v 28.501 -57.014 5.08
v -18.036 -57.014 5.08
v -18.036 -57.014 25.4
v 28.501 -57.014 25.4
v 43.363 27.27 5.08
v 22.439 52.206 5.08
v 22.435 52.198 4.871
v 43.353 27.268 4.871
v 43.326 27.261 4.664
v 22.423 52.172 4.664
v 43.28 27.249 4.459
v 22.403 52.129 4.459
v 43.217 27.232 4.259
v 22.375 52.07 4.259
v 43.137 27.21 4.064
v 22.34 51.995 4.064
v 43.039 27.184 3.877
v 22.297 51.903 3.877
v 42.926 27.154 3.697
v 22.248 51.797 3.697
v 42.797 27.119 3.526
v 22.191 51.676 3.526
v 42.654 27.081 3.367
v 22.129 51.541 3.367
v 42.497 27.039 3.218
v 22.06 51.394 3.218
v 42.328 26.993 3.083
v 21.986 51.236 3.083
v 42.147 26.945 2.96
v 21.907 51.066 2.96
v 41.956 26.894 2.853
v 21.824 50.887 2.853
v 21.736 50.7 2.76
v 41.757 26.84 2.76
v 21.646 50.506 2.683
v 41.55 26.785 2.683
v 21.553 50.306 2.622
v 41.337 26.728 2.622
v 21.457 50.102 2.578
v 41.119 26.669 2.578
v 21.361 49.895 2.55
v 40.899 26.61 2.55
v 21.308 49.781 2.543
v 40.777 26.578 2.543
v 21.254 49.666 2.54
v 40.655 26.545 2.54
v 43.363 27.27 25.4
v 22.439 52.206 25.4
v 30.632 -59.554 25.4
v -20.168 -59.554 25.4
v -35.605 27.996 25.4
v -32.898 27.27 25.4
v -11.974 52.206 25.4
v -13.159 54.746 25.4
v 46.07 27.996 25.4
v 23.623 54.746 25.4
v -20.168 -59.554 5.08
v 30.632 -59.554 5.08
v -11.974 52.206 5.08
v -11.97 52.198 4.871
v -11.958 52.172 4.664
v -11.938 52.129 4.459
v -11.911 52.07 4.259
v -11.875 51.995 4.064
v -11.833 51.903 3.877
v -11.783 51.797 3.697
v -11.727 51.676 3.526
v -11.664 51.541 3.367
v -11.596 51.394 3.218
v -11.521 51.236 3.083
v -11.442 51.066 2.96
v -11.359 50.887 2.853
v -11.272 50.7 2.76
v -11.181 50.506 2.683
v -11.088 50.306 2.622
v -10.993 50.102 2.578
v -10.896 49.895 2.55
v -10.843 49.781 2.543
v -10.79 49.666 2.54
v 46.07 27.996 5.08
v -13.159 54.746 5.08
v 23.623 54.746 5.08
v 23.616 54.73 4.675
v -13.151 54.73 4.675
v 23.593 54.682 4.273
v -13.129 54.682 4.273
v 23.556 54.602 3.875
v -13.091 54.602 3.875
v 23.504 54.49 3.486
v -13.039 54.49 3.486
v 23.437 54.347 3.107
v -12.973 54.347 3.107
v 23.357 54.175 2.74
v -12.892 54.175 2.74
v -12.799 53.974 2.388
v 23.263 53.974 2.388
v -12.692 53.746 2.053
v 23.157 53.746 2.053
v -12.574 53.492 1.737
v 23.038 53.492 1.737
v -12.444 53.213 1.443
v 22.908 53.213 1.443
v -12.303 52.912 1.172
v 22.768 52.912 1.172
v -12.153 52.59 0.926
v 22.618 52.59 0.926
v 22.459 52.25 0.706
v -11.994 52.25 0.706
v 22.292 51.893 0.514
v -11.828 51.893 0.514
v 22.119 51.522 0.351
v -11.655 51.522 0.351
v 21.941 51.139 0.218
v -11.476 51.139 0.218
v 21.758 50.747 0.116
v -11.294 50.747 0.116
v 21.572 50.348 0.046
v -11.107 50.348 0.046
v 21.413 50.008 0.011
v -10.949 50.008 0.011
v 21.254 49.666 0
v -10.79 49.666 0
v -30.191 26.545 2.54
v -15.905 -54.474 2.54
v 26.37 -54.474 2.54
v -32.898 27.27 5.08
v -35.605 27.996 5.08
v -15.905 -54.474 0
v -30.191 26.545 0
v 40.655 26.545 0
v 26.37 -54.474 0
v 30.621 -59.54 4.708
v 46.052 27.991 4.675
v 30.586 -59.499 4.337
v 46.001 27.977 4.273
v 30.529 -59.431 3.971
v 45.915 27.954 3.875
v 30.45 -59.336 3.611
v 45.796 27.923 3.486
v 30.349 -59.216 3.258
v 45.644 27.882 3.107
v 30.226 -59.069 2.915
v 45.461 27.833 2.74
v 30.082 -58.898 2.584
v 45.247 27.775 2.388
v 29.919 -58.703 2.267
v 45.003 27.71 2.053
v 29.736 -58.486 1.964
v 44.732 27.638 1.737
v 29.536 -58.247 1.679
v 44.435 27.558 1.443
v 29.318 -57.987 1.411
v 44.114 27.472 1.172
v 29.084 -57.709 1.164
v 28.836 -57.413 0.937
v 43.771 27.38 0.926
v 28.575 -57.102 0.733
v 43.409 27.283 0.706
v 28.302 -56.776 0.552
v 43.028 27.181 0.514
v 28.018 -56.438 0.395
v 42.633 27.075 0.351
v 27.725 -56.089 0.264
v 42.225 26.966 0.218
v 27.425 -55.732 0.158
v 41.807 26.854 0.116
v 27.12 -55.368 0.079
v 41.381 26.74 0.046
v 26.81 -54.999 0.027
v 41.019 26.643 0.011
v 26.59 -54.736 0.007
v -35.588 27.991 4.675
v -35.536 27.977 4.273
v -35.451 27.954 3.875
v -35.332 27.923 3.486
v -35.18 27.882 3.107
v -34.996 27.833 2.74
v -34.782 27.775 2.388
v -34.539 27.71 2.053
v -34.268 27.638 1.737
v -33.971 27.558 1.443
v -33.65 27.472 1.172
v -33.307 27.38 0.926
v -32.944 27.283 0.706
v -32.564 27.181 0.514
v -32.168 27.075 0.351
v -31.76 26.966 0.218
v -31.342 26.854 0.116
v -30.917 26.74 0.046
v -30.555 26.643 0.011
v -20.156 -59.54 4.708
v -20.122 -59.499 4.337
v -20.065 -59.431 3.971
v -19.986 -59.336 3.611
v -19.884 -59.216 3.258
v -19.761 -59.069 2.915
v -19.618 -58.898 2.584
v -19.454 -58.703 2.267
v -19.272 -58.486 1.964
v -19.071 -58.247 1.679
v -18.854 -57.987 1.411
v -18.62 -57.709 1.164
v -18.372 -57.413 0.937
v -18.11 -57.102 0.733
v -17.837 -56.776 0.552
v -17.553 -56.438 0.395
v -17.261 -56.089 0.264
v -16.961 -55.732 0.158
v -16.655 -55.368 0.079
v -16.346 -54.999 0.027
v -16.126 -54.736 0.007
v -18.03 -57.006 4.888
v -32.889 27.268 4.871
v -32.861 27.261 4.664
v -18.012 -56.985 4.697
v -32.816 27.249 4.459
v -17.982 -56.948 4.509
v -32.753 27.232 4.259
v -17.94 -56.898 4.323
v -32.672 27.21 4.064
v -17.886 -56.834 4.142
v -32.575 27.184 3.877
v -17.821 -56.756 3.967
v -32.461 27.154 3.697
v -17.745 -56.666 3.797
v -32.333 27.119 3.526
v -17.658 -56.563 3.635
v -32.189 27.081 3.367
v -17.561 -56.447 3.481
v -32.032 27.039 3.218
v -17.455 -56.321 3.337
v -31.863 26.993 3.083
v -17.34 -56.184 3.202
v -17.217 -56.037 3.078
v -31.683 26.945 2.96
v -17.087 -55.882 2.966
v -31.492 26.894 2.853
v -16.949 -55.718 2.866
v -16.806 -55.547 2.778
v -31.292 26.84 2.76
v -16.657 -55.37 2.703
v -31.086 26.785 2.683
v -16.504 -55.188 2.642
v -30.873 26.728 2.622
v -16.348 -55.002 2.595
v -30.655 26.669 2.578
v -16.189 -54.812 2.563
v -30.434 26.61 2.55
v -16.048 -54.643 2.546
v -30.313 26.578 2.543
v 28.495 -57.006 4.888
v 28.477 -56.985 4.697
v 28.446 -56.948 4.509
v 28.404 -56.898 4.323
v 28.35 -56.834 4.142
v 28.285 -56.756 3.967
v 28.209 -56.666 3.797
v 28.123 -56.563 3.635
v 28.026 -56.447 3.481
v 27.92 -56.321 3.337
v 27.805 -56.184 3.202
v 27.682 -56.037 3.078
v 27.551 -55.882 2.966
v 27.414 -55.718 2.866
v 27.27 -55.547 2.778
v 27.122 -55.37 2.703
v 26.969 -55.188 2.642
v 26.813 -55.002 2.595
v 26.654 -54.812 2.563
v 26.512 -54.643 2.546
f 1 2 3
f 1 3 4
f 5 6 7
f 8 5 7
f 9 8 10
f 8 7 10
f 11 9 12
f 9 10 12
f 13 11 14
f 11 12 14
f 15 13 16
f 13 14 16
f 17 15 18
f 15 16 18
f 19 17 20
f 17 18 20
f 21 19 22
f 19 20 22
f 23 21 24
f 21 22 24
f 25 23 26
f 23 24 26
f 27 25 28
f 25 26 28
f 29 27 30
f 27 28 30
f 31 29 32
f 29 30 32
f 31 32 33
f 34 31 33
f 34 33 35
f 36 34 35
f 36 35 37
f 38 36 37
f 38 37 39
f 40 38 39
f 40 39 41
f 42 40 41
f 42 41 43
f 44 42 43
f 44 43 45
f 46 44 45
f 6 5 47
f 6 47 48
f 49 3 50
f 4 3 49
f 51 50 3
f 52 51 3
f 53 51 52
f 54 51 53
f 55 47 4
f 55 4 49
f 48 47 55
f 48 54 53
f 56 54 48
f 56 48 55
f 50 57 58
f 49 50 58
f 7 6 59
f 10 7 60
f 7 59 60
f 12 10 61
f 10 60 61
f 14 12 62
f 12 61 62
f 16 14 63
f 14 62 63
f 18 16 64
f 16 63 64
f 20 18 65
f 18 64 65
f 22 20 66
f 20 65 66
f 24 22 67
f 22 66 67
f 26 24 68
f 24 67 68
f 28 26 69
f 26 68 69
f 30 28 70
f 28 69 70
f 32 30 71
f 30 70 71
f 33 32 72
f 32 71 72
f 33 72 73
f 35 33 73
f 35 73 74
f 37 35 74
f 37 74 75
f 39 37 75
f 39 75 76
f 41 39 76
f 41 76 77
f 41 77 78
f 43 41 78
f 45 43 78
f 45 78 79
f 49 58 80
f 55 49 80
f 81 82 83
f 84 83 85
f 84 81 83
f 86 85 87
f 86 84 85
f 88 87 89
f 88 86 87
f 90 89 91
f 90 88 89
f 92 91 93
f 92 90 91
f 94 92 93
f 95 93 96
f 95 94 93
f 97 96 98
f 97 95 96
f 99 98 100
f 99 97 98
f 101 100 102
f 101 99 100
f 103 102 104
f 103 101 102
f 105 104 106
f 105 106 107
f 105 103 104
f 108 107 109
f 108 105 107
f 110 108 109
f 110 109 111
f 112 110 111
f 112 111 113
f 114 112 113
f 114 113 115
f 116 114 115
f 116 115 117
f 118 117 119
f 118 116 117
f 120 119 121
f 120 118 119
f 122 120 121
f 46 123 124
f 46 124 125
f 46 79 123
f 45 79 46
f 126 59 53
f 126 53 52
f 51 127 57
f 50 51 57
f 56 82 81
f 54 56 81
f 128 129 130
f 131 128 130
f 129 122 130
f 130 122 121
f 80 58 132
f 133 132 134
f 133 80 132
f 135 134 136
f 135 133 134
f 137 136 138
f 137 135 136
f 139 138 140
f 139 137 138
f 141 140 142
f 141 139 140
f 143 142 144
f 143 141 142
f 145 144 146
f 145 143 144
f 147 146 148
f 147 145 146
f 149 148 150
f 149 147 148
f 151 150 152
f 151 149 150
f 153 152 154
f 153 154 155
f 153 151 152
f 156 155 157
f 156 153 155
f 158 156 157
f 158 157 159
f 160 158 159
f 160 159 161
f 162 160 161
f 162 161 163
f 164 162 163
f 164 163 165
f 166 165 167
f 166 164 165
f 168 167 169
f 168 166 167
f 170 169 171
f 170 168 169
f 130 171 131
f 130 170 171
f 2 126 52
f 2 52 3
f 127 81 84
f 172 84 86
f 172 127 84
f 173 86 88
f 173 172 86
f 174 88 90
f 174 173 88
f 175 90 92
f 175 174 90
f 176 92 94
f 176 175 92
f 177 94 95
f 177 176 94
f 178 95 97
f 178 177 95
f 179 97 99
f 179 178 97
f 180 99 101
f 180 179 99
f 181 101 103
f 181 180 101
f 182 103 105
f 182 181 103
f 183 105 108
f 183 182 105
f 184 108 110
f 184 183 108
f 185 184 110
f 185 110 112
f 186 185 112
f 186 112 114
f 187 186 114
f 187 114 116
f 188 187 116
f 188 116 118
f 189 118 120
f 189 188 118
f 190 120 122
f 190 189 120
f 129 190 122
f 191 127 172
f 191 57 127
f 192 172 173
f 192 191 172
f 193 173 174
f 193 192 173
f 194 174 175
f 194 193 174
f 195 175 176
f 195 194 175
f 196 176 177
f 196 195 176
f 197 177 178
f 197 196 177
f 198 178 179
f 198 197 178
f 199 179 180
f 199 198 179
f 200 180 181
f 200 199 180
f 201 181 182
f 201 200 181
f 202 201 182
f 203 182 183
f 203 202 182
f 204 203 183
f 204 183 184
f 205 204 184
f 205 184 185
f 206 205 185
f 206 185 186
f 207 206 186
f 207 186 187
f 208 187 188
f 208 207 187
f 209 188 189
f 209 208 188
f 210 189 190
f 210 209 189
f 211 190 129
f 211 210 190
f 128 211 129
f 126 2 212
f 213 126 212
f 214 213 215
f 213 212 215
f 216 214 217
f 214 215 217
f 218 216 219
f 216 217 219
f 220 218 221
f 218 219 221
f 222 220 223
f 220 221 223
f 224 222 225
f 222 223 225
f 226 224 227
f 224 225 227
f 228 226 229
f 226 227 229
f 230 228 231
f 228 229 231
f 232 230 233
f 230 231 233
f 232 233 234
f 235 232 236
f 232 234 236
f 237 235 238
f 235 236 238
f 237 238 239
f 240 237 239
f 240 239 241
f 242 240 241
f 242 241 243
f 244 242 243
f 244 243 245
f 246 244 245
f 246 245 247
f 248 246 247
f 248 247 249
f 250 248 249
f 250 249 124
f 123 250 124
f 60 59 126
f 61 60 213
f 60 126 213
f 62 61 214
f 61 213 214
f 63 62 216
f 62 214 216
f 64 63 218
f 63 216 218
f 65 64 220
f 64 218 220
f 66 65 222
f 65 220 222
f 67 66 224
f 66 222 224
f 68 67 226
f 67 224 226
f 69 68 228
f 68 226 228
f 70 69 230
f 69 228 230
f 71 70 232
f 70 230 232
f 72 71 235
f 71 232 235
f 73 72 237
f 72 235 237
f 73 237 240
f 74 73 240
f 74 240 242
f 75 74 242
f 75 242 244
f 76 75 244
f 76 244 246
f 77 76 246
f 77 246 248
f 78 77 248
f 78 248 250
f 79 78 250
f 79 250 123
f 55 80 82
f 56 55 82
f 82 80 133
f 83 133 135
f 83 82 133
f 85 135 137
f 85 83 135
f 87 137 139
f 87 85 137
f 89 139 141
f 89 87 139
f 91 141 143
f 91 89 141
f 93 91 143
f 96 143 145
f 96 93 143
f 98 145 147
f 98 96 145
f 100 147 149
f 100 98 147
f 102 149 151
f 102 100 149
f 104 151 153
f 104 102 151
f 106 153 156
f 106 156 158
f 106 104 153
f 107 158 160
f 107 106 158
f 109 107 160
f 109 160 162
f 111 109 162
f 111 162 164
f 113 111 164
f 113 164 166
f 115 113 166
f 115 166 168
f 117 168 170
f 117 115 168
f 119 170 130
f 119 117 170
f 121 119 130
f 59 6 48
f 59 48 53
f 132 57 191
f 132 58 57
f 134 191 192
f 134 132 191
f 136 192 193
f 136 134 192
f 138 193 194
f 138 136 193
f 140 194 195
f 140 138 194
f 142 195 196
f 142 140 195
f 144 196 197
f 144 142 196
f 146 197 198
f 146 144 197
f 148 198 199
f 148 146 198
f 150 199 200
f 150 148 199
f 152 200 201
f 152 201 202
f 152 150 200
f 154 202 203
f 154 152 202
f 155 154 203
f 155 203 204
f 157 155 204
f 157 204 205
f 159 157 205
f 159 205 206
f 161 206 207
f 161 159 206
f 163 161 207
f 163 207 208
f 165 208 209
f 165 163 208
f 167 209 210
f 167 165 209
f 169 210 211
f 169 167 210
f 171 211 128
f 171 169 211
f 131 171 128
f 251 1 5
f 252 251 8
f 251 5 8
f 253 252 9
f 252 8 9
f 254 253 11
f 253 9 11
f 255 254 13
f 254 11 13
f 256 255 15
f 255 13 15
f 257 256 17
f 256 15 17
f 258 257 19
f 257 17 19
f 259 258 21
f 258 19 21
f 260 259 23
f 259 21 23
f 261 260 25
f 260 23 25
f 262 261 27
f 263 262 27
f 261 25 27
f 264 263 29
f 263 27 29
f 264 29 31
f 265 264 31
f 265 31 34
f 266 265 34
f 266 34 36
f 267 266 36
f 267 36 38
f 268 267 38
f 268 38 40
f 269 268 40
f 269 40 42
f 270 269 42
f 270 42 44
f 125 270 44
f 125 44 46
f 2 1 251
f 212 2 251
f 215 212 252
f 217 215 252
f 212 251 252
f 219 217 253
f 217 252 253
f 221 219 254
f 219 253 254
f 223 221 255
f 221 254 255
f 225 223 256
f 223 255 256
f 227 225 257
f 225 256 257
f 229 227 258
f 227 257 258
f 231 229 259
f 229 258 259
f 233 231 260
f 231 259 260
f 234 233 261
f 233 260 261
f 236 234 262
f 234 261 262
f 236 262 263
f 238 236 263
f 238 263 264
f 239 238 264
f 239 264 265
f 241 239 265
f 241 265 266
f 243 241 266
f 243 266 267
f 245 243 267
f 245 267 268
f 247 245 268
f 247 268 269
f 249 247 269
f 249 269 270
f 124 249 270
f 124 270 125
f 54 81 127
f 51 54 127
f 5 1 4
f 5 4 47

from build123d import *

# Parameters (mm, degrees)
F1_DEPTH = 25.4
F2_R     = 5.08
F3_T     = -2.54


with BuildPart() as f1:
    # F0 (on Top) → F1 (new body)
    with BuildSketch(Plane.XY):
        Polygon((-13.158648, 54.746445), (-35.605059, 27.995854), (-20.167736, -59.553555), (30.632264, -59.553555), (46.069587, 27.995854), (23.623176, 54.746445), align=None)
    extrude(amount=F1_DEPTH)

    # F2
    f2_edges = [f1.edges().sort_by_distance(p)[0] for p in [
        (-27.886397, -15.77885, 0),
        (5.232264, -59.553555, 0),
        (38.350926, -15.77885, 0),
        (34.846382, 41.37115, 0),
        (5.232264, 54.746445, 0),
        (-24.381853, 41.37115, 0),
    ]]
    fillet(f2_edges, radius=F2_R)

    # F3
    f3_openings = [f1.faces().sort_by_distance(p)[0] for p in [
        (5.232264, -1.206794, 25.4),
    ]]
    offset(amount=F3_T, openings=f3_openings)


solid = f1.part
